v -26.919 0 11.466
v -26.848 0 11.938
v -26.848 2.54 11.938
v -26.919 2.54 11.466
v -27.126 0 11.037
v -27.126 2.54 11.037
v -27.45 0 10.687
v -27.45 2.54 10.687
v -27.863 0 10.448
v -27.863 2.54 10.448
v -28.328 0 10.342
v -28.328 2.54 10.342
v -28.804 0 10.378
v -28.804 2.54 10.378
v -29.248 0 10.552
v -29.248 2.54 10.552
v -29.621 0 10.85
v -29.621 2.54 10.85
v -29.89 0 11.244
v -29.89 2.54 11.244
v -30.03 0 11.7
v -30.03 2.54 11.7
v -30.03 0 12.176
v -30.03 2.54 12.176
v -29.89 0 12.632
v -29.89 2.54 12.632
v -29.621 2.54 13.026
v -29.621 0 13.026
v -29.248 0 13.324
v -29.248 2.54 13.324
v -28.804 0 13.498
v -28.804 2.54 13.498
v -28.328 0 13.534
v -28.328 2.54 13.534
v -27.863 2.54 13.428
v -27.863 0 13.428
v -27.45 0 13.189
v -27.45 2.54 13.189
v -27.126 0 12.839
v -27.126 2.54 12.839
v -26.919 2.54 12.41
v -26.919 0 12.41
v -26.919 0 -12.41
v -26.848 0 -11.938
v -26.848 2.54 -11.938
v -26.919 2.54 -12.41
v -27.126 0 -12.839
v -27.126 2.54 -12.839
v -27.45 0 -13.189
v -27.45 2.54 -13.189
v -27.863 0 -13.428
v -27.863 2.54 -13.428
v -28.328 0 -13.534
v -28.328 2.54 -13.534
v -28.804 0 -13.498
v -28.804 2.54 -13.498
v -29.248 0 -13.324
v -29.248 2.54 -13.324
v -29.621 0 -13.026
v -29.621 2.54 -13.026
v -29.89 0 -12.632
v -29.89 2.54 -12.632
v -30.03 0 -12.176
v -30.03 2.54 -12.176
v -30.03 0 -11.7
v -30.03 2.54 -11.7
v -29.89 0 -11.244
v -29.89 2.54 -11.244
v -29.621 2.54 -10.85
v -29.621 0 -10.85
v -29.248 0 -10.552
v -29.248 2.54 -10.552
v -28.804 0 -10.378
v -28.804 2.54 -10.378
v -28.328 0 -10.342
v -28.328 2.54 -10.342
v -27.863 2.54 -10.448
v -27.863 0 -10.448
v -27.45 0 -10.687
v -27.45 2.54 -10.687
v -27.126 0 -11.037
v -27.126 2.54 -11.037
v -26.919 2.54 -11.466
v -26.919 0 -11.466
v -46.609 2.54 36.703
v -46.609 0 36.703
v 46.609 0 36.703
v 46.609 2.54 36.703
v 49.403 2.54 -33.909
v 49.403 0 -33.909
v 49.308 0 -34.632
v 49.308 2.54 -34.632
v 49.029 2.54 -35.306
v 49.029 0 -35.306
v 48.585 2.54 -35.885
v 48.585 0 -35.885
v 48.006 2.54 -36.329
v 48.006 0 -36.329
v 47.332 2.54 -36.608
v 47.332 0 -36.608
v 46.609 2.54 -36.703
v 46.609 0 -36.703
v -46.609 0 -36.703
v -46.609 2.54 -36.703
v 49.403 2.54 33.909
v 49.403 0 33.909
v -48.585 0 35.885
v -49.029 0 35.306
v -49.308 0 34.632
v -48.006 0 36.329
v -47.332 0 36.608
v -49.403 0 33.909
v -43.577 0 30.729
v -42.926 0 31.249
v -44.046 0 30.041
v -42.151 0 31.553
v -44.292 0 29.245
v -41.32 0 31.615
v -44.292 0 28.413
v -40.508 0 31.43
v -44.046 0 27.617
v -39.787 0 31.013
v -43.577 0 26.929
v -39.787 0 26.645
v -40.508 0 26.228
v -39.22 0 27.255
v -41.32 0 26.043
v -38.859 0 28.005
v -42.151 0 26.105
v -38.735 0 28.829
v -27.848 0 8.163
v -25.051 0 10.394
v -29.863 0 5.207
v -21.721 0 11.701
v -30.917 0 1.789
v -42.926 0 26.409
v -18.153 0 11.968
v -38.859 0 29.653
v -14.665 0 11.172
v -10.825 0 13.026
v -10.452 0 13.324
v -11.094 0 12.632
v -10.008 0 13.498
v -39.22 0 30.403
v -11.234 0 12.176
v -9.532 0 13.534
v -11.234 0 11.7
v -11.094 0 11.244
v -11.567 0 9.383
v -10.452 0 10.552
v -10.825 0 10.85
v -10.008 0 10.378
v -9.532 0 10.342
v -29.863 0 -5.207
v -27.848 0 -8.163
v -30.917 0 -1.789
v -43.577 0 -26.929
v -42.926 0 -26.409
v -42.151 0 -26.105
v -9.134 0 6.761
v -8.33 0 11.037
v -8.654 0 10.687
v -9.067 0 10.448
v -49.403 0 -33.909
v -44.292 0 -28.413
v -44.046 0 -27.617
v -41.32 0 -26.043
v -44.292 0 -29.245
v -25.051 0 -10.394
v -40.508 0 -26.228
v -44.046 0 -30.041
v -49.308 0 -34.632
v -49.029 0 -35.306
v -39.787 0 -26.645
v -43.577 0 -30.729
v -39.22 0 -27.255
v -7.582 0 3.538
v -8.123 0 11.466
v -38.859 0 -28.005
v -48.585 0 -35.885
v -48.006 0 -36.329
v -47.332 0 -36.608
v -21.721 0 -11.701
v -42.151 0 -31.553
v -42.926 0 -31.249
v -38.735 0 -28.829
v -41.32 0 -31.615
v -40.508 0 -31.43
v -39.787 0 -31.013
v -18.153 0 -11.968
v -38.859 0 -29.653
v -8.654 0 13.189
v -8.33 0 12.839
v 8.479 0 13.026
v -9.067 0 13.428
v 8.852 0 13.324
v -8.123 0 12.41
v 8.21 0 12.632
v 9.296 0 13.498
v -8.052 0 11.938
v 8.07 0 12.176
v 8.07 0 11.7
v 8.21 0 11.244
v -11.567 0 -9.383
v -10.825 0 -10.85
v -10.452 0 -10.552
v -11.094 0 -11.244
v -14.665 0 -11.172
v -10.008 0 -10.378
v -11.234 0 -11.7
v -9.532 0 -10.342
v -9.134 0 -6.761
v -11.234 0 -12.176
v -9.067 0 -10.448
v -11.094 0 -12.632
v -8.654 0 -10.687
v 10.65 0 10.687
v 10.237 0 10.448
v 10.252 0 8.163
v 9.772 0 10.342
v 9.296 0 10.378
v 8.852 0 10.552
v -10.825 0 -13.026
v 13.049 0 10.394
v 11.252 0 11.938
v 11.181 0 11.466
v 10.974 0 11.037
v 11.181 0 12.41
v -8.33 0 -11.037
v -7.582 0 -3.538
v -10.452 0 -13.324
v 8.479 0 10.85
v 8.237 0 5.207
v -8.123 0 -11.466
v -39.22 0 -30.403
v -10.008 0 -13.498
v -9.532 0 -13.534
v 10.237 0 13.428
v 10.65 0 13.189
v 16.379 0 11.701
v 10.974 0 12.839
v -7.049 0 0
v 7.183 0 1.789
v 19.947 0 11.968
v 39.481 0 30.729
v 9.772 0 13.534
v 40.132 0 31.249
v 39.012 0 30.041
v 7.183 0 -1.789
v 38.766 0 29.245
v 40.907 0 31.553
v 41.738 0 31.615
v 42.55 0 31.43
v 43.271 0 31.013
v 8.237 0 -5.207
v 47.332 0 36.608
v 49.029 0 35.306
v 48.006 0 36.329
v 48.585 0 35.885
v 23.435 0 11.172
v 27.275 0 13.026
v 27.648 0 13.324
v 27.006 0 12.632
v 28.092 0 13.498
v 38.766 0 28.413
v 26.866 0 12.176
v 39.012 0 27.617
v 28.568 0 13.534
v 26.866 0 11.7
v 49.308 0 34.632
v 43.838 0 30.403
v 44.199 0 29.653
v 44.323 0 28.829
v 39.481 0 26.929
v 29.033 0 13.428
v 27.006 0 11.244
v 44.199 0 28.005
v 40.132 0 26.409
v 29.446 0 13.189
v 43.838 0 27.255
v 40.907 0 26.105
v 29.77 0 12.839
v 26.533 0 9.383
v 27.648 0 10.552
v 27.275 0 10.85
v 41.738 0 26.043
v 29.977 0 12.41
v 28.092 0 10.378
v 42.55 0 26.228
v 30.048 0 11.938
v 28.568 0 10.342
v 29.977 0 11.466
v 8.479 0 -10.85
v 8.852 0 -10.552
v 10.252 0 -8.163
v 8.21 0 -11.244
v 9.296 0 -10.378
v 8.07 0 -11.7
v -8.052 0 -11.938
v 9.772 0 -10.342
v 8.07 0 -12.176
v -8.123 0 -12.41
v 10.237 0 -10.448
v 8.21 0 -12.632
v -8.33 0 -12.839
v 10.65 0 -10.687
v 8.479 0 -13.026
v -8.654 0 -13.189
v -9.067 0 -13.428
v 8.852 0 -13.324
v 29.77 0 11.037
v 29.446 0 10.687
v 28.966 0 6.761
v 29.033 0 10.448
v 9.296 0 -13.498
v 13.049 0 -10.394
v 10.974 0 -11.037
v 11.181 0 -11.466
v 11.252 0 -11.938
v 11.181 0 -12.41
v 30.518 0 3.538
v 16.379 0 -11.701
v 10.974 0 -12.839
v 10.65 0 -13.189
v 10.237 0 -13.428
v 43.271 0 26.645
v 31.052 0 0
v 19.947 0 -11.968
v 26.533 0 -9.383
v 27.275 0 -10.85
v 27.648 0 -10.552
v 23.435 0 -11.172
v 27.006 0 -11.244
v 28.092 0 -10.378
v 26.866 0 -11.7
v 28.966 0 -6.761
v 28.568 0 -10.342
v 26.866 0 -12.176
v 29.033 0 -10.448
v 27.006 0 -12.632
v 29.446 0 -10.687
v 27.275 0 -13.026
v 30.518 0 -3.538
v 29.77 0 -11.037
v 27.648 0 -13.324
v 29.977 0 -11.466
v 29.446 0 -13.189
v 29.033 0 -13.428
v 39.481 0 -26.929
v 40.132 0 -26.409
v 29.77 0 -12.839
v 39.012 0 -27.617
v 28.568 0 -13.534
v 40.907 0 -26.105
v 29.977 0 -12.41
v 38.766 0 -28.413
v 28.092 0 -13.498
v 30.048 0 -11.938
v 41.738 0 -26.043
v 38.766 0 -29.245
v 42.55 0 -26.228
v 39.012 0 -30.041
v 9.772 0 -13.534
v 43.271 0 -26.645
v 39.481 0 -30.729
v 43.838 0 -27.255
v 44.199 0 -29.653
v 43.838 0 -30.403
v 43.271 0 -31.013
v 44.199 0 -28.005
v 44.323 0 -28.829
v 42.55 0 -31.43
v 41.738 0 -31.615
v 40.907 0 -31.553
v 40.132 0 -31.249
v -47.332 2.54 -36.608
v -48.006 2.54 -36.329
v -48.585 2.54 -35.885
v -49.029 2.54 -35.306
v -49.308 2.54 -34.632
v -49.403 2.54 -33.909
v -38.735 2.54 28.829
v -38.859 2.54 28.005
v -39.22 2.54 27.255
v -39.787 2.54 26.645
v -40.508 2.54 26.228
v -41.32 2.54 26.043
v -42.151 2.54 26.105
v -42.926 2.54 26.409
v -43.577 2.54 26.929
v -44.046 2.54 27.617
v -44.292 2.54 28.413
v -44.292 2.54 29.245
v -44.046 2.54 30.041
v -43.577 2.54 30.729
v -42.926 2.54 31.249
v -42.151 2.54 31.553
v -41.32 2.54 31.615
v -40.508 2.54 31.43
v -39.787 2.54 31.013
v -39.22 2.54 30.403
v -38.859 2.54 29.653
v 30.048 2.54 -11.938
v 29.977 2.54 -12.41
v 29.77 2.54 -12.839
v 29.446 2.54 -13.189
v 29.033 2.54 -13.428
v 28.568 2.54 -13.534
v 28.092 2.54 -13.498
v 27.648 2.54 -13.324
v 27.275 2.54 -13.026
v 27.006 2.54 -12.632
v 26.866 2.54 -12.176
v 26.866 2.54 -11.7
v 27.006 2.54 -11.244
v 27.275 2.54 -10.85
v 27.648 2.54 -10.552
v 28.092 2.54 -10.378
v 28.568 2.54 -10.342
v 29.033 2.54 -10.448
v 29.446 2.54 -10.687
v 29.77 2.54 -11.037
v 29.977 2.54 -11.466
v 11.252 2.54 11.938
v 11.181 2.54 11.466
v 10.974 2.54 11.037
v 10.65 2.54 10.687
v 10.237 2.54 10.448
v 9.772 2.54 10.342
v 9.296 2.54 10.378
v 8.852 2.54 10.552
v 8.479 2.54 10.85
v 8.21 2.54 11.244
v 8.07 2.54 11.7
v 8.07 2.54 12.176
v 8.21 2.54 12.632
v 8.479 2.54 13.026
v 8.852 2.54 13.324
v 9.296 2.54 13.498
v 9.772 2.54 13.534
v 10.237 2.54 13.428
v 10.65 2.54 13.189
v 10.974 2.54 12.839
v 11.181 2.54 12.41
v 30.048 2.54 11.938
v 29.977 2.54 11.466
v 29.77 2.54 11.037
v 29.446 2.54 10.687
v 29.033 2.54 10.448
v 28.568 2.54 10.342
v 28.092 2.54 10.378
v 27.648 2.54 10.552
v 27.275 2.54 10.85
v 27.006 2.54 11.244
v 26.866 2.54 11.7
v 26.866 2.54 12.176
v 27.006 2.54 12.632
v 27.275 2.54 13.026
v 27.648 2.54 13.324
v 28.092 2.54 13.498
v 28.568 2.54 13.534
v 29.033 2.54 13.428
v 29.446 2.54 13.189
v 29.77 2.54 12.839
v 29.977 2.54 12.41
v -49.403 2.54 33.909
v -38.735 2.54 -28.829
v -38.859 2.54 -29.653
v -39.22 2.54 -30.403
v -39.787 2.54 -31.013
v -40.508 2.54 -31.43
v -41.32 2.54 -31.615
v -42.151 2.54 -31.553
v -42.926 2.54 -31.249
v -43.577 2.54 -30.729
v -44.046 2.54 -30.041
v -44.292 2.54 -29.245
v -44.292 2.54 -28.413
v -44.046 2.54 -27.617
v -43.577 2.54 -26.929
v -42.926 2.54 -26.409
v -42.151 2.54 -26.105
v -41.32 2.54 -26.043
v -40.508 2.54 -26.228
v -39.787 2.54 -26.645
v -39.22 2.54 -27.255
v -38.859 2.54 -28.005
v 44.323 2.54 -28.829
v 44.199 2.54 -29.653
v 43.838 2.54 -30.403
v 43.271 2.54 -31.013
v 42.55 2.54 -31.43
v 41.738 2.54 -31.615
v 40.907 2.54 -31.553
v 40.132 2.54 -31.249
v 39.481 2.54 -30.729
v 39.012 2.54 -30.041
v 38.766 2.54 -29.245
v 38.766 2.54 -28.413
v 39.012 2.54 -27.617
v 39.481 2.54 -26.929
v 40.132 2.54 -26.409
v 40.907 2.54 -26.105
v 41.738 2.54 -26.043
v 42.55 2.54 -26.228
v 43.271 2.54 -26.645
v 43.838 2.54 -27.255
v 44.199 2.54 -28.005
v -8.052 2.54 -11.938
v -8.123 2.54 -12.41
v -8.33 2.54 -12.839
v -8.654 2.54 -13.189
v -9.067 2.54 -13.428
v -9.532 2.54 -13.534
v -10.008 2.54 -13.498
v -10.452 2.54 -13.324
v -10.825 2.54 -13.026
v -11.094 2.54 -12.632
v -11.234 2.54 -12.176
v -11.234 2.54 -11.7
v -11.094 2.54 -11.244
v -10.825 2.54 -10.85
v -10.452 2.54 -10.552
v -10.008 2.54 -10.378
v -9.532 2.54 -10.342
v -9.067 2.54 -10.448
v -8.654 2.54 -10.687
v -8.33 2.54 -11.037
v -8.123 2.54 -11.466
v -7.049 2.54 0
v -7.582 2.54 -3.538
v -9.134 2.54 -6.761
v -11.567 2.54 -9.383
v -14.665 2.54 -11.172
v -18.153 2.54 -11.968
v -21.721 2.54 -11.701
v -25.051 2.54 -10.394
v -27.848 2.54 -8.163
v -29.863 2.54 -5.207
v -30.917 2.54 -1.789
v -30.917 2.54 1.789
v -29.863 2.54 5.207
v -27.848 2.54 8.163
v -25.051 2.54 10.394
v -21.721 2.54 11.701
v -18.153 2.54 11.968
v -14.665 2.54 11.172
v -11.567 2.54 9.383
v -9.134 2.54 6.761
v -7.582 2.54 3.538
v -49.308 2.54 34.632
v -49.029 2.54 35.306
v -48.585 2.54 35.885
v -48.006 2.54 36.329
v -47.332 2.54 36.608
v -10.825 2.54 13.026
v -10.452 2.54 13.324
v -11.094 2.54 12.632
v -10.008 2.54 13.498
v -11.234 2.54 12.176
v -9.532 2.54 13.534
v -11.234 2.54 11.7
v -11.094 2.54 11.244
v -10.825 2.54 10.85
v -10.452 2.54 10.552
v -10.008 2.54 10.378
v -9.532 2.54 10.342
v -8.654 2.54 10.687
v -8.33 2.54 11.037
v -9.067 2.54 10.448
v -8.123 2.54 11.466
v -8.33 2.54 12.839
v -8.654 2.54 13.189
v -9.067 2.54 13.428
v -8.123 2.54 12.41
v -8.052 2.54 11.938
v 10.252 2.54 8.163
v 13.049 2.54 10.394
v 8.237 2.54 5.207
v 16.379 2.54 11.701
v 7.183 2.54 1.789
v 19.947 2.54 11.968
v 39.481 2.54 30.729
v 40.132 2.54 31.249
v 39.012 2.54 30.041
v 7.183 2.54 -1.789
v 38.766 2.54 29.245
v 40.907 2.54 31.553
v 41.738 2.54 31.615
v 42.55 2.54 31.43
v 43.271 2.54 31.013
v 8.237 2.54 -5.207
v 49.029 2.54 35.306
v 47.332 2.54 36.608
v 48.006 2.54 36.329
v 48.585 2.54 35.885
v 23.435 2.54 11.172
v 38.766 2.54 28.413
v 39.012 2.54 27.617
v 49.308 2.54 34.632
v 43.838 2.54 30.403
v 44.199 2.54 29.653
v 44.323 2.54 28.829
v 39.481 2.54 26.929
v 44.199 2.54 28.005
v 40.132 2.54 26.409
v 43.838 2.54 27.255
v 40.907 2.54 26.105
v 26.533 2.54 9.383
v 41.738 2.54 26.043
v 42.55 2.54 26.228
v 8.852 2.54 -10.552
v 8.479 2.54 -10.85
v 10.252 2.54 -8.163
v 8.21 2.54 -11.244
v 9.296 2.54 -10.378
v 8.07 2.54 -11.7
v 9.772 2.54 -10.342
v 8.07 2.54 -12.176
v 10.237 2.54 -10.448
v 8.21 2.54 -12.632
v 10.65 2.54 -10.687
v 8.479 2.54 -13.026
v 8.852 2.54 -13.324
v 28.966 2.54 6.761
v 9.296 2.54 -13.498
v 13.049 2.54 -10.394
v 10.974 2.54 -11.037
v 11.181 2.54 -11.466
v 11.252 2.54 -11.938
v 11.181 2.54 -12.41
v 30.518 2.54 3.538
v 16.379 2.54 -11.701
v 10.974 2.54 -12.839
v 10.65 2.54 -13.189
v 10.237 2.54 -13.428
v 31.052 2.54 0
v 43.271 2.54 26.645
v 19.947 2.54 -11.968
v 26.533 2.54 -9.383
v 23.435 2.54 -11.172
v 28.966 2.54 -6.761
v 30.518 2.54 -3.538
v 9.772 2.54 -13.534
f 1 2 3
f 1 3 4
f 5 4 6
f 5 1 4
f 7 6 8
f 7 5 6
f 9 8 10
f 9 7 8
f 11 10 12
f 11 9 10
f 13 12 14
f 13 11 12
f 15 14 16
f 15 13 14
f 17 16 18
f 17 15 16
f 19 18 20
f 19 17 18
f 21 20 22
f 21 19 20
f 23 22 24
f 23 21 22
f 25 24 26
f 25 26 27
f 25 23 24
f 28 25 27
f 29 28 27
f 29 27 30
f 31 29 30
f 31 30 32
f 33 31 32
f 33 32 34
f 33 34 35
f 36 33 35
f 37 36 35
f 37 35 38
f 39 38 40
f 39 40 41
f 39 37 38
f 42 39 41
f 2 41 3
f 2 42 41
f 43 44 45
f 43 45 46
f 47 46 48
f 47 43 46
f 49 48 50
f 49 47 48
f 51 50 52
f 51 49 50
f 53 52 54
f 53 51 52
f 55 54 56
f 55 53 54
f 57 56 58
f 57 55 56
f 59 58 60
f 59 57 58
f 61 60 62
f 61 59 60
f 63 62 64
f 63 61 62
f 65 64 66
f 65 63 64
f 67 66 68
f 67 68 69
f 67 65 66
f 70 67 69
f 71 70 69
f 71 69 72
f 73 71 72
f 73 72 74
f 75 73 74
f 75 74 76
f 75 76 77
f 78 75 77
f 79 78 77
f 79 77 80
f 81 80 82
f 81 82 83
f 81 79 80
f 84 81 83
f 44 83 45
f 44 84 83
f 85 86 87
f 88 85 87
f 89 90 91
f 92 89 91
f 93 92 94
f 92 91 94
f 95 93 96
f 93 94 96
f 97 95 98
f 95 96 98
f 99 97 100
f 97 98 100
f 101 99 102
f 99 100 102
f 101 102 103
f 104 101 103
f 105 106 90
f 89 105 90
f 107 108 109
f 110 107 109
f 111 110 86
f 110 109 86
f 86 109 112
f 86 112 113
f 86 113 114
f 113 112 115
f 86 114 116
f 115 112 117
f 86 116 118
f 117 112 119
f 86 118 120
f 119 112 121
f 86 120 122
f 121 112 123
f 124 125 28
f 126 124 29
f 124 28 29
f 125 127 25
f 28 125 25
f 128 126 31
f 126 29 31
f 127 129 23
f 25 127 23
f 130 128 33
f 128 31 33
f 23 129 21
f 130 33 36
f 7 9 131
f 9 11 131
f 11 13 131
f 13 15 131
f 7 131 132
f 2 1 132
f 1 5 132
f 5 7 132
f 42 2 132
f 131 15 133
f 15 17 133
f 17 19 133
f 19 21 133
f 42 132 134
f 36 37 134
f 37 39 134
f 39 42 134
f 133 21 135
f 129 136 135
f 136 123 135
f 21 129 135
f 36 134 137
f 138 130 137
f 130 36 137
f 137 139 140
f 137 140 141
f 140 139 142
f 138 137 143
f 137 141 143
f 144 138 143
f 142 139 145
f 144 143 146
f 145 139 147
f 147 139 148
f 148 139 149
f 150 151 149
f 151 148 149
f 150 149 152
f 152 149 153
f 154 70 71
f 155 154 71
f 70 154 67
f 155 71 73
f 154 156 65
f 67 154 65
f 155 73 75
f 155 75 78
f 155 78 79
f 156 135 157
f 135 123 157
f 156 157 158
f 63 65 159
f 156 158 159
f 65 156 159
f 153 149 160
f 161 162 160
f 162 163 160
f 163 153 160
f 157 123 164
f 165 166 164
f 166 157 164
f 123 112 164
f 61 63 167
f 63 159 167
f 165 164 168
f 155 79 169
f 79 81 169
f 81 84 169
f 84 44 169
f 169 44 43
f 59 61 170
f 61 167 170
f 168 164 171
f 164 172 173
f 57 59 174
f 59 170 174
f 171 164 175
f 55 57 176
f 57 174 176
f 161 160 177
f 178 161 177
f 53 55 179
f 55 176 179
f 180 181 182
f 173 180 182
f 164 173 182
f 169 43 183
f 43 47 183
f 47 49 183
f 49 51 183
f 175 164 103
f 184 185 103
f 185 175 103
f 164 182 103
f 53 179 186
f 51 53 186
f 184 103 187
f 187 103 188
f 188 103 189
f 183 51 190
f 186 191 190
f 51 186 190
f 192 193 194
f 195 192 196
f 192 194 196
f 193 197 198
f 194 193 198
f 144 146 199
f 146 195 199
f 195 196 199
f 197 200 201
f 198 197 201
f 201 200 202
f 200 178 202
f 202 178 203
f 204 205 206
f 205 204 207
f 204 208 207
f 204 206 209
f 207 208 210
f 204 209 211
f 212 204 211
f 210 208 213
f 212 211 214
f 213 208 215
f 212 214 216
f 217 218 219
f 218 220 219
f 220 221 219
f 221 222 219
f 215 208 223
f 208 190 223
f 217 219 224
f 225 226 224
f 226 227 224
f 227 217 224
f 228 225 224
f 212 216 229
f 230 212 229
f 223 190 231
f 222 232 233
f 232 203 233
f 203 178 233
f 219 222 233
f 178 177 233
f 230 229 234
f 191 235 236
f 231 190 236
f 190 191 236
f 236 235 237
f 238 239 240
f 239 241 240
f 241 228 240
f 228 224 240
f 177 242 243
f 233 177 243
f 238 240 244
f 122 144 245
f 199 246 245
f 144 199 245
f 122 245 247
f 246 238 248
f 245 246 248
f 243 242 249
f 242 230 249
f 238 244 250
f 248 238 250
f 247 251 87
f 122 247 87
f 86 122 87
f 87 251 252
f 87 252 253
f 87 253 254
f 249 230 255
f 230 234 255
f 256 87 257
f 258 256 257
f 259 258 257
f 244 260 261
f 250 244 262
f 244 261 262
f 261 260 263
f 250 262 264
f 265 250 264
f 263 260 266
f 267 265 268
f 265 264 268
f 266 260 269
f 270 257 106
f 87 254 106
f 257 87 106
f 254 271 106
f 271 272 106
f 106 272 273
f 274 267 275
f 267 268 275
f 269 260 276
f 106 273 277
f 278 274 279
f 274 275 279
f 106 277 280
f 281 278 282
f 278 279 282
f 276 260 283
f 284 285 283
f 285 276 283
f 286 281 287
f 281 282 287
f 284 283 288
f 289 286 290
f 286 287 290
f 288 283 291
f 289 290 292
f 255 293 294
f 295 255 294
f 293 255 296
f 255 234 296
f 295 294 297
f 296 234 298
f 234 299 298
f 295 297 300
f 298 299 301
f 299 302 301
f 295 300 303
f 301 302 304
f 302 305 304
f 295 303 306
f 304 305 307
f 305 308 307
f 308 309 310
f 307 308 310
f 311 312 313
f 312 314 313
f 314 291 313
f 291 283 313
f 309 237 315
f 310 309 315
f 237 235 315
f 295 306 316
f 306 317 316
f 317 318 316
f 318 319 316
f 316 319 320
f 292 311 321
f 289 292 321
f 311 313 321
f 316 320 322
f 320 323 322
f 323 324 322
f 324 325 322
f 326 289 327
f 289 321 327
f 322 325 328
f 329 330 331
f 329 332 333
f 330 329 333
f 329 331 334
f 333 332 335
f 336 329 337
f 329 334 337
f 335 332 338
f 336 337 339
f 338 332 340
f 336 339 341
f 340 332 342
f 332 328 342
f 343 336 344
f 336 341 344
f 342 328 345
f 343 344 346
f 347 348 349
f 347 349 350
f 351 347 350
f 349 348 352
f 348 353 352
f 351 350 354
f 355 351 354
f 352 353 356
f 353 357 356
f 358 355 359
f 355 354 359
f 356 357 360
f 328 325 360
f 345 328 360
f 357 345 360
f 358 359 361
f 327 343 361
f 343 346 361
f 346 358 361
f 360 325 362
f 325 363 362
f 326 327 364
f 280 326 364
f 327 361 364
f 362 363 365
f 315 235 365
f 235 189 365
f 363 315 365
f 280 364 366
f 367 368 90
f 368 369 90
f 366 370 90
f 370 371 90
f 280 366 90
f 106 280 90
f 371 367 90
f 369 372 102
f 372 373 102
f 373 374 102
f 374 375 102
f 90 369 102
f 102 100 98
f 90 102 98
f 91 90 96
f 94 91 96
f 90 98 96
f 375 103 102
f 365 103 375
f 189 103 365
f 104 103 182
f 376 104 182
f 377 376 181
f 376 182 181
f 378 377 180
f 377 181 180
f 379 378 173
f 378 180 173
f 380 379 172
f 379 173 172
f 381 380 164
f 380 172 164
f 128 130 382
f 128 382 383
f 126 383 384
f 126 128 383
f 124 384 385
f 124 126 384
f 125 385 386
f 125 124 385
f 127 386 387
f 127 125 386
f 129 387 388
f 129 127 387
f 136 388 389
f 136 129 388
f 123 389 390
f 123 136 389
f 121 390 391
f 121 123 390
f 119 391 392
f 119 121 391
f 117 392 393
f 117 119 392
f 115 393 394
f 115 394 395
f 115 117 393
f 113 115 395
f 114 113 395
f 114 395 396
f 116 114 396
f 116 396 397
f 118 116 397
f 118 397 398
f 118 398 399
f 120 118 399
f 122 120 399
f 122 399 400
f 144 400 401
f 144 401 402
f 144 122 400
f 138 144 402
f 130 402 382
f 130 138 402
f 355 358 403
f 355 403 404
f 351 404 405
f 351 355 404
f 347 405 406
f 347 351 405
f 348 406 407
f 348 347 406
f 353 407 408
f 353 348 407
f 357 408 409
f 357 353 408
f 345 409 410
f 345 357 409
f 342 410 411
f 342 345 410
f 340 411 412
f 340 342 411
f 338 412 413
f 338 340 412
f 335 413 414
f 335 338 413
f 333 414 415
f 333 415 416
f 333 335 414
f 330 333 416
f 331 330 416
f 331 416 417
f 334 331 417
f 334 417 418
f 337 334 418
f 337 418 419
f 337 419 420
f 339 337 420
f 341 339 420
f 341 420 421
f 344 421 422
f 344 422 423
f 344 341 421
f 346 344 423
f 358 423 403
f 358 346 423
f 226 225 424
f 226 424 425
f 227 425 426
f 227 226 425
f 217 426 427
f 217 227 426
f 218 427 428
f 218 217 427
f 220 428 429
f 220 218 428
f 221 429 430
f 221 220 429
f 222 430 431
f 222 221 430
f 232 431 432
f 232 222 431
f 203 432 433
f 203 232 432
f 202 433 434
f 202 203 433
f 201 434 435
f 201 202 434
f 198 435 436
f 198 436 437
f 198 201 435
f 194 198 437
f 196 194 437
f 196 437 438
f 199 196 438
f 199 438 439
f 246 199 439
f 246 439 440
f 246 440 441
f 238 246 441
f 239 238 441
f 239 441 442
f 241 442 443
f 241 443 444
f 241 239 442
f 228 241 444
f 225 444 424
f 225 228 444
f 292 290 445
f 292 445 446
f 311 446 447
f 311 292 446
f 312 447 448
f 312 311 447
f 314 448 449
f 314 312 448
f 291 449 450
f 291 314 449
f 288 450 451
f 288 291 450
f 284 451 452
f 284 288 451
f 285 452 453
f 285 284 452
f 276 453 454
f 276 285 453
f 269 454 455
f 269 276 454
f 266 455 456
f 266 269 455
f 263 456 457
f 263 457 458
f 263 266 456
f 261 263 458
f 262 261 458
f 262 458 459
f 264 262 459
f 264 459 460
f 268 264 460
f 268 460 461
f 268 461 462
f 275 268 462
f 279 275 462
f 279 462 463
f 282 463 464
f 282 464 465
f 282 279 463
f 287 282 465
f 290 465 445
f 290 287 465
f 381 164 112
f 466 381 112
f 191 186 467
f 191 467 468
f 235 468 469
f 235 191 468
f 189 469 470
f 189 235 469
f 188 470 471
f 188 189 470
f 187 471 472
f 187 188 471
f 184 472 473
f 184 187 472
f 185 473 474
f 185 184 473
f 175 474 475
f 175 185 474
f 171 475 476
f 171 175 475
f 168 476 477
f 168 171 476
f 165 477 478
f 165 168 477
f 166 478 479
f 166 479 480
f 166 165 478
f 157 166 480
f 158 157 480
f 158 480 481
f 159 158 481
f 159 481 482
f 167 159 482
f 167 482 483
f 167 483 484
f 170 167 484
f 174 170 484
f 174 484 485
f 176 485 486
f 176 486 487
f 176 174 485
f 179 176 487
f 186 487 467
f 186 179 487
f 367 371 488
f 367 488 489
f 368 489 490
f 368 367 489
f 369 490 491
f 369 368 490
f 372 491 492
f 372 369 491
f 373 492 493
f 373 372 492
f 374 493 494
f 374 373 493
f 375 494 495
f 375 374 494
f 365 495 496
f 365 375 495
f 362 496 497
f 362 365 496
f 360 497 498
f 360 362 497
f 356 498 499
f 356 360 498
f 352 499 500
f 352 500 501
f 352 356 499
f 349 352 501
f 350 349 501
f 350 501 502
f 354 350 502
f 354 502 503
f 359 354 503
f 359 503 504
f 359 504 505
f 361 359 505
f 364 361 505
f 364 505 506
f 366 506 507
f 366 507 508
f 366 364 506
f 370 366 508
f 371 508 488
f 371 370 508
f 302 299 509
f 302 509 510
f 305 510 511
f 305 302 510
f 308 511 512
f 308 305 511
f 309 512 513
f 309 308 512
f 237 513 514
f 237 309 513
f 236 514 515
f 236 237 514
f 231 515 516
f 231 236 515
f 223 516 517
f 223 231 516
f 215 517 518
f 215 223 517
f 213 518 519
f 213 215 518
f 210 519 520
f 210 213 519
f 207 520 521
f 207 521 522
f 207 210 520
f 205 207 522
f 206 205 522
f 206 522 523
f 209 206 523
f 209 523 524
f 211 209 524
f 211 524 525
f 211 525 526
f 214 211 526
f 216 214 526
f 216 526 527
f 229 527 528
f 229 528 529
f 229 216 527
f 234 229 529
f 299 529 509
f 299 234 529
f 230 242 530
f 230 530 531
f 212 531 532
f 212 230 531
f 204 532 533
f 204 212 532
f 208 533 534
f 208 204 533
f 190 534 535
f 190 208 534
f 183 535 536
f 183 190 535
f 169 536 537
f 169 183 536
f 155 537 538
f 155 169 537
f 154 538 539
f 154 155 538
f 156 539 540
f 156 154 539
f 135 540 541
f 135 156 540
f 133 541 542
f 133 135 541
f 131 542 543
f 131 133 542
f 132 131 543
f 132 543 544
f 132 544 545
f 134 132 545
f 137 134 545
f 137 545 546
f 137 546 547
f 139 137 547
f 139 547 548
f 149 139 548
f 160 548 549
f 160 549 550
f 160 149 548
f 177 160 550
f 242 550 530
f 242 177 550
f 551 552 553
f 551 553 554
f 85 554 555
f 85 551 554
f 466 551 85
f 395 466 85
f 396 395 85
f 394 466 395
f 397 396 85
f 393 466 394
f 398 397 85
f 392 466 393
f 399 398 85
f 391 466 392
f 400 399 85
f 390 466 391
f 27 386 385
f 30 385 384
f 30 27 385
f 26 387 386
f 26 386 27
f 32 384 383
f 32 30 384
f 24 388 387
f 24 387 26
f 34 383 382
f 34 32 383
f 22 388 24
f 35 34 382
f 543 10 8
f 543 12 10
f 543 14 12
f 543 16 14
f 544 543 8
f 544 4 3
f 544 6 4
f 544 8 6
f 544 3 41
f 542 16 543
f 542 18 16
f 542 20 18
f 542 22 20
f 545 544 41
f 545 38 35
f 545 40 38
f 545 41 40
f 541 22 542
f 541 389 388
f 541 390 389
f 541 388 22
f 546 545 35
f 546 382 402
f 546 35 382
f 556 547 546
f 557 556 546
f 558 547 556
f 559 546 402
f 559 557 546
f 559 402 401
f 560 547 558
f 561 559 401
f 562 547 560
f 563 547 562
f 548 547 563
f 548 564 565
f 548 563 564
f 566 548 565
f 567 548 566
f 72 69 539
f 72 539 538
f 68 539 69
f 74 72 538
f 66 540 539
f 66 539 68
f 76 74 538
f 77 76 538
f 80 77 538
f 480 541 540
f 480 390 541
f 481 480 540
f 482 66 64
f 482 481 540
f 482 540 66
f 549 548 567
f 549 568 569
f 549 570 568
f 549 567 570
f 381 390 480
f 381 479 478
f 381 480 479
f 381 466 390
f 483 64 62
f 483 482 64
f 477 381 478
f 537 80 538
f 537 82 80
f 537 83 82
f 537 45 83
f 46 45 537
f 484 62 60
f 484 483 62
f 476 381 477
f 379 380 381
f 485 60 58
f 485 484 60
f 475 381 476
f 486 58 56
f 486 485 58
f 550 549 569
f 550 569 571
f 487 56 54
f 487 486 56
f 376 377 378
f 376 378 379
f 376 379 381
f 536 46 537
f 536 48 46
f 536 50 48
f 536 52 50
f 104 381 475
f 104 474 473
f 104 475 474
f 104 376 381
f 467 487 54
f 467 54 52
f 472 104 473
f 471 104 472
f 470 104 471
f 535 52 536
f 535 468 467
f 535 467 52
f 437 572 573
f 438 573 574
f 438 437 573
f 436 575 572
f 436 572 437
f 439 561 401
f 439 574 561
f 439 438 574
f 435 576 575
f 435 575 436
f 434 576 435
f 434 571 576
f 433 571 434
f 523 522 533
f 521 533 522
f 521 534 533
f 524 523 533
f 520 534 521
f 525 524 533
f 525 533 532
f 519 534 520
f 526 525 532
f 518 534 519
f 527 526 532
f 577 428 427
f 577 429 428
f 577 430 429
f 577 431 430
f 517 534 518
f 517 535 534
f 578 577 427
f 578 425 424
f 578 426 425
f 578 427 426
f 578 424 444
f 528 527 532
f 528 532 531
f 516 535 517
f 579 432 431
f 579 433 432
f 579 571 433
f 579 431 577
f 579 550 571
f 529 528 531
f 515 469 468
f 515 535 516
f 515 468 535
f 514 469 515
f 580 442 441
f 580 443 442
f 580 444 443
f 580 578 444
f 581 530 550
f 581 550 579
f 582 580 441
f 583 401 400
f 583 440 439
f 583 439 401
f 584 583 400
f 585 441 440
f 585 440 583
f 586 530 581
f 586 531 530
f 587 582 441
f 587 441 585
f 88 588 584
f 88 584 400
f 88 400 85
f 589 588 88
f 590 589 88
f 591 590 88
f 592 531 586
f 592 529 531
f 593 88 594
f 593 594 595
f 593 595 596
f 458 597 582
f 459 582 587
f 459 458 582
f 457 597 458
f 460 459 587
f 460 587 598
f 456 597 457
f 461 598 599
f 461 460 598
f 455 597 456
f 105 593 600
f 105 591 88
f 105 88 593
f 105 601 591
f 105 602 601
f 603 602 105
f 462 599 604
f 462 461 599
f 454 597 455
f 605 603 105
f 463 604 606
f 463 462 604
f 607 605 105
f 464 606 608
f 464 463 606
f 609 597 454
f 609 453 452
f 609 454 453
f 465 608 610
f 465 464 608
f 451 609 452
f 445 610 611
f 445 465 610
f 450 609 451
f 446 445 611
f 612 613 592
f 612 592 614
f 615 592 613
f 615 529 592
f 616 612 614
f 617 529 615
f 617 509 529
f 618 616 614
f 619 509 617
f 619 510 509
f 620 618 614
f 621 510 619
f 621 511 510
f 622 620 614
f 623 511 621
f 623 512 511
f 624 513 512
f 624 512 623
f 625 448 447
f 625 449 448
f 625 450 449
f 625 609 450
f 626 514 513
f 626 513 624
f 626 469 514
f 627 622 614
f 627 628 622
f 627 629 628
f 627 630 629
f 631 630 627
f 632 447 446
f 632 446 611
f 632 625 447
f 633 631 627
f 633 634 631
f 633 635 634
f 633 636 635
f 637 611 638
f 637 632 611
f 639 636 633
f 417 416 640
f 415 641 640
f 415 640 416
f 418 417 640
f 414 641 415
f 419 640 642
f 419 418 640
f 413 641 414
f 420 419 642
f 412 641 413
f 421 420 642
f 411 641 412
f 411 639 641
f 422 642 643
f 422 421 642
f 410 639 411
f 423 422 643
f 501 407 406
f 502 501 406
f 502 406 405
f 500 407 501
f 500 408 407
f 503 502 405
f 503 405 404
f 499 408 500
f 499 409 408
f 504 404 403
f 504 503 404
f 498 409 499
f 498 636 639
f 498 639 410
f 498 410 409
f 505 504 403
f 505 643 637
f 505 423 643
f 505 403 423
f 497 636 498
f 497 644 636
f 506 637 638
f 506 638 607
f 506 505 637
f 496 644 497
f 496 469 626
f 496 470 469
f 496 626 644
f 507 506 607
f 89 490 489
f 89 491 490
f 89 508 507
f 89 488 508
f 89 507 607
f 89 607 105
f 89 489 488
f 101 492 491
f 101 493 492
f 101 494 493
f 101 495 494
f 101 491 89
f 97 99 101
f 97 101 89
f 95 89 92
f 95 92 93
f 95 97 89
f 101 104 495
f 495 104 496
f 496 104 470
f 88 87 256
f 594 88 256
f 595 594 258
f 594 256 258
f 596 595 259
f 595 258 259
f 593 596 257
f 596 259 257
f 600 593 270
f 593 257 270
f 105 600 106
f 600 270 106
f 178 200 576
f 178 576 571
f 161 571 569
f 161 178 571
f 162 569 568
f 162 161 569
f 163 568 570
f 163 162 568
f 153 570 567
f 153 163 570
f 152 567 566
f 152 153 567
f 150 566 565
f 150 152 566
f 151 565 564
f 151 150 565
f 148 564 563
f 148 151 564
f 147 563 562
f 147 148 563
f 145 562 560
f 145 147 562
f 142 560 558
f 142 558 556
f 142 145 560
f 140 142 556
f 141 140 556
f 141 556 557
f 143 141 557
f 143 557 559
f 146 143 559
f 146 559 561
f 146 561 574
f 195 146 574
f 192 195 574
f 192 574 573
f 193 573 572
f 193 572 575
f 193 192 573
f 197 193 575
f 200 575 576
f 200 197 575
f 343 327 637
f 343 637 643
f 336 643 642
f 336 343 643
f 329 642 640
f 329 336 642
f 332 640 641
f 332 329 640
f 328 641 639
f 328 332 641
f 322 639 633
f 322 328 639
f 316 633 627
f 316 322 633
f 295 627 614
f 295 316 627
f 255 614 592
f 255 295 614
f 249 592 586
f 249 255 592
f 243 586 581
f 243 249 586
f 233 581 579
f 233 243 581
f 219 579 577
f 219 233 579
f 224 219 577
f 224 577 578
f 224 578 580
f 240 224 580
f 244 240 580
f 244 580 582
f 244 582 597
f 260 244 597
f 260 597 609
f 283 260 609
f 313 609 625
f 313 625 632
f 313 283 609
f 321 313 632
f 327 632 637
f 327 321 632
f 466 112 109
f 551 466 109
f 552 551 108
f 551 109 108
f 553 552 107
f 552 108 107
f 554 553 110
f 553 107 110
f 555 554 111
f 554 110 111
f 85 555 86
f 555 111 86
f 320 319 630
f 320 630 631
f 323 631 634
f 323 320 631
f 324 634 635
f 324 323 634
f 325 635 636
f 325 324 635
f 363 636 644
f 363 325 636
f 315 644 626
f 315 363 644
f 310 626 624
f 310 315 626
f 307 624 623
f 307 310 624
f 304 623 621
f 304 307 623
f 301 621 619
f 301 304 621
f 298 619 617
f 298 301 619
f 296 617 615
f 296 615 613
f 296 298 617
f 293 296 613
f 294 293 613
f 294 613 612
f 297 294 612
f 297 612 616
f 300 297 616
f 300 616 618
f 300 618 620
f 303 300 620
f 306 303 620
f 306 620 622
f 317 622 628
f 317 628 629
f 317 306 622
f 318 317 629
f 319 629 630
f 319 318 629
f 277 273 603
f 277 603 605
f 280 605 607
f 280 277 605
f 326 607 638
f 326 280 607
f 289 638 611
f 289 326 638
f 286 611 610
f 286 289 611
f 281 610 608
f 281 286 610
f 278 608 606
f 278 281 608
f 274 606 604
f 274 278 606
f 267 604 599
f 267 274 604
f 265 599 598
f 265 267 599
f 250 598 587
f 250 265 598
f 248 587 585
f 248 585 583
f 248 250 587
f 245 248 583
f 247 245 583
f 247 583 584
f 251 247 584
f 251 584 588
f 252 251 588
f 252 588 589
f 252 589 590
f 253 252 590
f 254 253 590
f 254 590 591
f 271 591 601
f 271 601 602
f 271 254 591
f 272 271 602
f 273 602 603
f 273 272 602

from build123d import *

# Parameters (mm, degrees)
SKETCH1_R           = 12.0015
SKETCH1_R_2         = 2.794
SKETCH1_R_3         = 1.6002
BOSS_EXTRUDE1_DEPTH = 2.54


with BuildPart() as part:
    # Sketch1 → Boss-Extrude1 (new body)
    with BuildSketch(Plane(origin=(0, 0, 0), x_dir=(1, 0, 0), z_dir=(0, 1, 0))):
        with BuildLine():
            Line((-46.609, -36.703), (46.609, -36.703))
            ThreePointArc((46.609, -36.703), (48.584656347, -35.884656347), (49.403, -33.909))
            Line((49.403, -33.909), (49.403, 33.909))
            ThreePointArc((49.403, 33.909), (48.584656347, 35.884656347), (46.609, 36.703))
            Line((46.609, 36.703), (-46.609, 36.703))
            ThreePointArc((-46.609, 36.703), (-48.584656347, 35.884656347), (-49.403, 33.909))
            Line((-49.403, 33.909), (-49.403, -33.909))
            ThreePointArc((-49.403, -33.909), (-48.584656347, -35.884656347), (-46.609, -36.703))
        make_face()
        with Locations((-19.05, 0)):
            Circle(SKETCH1_R, mode=Mode.SUBTRACT)
        with Locations((19.05, 0)):
            Circle(SKETCH1_R, mode=Mode.SUBTRACT)
        with Locations((-41.529, 28.829)):
            Circle(SKETCH1_R_2, mode=Mode.SUBTRACT)
        with Locations((-28.448, -11.938)):
            Circle(SKETCH1_R_3, mode=Mode.SUBTRACT)
        with Locations((-9.652, -11.938)):
            Circle(SKETCH1_R_3, mode=Mode.SUBTRACT)
        with Locations((-9.652, 11.938)):
            Circle(SKETCH1_R_3, mode=Mode.SUBTRACT)
        with Locations((-28.448, 11.938)):
            Circle(SKETCH1_R_3, mode=Mode.SUBTRACT)
        with Locations((9.652, 11.938)):
            Circle(SKETCH1_R_3, mode=Mode.SUBTRACT)
        with Locations((28.448, 11.938)):
            Circle(SKETCH1_R_3, mode=Mode.SUBTRACT)
        with Locations((28.448, -11.938)):
            Circle(SKETCH1_R_3, mode=Mode.SUBTRACT)
        with Locations((9.652, -11.938)):
            Circle(SKETCH1_R_3, mode=Mode.SUBTRACT)
        with Locations((41.529, 28.829)):
            Circle(SKETCH1_R_2, mode=Mode.SUBTRACT)
        with Locations((41.529, -28.829)):
            Circle(SKETCH1_R_2, mode=Mode.SUBTRACT)
        with Locations((-41.529, -28.829)):
            Circle(SKETCH1_R_2, mode=Mode.SUBTRACT)
    extrude(amount=BOSS_EXTRUDE1_DEPTH)


solid = part.part
